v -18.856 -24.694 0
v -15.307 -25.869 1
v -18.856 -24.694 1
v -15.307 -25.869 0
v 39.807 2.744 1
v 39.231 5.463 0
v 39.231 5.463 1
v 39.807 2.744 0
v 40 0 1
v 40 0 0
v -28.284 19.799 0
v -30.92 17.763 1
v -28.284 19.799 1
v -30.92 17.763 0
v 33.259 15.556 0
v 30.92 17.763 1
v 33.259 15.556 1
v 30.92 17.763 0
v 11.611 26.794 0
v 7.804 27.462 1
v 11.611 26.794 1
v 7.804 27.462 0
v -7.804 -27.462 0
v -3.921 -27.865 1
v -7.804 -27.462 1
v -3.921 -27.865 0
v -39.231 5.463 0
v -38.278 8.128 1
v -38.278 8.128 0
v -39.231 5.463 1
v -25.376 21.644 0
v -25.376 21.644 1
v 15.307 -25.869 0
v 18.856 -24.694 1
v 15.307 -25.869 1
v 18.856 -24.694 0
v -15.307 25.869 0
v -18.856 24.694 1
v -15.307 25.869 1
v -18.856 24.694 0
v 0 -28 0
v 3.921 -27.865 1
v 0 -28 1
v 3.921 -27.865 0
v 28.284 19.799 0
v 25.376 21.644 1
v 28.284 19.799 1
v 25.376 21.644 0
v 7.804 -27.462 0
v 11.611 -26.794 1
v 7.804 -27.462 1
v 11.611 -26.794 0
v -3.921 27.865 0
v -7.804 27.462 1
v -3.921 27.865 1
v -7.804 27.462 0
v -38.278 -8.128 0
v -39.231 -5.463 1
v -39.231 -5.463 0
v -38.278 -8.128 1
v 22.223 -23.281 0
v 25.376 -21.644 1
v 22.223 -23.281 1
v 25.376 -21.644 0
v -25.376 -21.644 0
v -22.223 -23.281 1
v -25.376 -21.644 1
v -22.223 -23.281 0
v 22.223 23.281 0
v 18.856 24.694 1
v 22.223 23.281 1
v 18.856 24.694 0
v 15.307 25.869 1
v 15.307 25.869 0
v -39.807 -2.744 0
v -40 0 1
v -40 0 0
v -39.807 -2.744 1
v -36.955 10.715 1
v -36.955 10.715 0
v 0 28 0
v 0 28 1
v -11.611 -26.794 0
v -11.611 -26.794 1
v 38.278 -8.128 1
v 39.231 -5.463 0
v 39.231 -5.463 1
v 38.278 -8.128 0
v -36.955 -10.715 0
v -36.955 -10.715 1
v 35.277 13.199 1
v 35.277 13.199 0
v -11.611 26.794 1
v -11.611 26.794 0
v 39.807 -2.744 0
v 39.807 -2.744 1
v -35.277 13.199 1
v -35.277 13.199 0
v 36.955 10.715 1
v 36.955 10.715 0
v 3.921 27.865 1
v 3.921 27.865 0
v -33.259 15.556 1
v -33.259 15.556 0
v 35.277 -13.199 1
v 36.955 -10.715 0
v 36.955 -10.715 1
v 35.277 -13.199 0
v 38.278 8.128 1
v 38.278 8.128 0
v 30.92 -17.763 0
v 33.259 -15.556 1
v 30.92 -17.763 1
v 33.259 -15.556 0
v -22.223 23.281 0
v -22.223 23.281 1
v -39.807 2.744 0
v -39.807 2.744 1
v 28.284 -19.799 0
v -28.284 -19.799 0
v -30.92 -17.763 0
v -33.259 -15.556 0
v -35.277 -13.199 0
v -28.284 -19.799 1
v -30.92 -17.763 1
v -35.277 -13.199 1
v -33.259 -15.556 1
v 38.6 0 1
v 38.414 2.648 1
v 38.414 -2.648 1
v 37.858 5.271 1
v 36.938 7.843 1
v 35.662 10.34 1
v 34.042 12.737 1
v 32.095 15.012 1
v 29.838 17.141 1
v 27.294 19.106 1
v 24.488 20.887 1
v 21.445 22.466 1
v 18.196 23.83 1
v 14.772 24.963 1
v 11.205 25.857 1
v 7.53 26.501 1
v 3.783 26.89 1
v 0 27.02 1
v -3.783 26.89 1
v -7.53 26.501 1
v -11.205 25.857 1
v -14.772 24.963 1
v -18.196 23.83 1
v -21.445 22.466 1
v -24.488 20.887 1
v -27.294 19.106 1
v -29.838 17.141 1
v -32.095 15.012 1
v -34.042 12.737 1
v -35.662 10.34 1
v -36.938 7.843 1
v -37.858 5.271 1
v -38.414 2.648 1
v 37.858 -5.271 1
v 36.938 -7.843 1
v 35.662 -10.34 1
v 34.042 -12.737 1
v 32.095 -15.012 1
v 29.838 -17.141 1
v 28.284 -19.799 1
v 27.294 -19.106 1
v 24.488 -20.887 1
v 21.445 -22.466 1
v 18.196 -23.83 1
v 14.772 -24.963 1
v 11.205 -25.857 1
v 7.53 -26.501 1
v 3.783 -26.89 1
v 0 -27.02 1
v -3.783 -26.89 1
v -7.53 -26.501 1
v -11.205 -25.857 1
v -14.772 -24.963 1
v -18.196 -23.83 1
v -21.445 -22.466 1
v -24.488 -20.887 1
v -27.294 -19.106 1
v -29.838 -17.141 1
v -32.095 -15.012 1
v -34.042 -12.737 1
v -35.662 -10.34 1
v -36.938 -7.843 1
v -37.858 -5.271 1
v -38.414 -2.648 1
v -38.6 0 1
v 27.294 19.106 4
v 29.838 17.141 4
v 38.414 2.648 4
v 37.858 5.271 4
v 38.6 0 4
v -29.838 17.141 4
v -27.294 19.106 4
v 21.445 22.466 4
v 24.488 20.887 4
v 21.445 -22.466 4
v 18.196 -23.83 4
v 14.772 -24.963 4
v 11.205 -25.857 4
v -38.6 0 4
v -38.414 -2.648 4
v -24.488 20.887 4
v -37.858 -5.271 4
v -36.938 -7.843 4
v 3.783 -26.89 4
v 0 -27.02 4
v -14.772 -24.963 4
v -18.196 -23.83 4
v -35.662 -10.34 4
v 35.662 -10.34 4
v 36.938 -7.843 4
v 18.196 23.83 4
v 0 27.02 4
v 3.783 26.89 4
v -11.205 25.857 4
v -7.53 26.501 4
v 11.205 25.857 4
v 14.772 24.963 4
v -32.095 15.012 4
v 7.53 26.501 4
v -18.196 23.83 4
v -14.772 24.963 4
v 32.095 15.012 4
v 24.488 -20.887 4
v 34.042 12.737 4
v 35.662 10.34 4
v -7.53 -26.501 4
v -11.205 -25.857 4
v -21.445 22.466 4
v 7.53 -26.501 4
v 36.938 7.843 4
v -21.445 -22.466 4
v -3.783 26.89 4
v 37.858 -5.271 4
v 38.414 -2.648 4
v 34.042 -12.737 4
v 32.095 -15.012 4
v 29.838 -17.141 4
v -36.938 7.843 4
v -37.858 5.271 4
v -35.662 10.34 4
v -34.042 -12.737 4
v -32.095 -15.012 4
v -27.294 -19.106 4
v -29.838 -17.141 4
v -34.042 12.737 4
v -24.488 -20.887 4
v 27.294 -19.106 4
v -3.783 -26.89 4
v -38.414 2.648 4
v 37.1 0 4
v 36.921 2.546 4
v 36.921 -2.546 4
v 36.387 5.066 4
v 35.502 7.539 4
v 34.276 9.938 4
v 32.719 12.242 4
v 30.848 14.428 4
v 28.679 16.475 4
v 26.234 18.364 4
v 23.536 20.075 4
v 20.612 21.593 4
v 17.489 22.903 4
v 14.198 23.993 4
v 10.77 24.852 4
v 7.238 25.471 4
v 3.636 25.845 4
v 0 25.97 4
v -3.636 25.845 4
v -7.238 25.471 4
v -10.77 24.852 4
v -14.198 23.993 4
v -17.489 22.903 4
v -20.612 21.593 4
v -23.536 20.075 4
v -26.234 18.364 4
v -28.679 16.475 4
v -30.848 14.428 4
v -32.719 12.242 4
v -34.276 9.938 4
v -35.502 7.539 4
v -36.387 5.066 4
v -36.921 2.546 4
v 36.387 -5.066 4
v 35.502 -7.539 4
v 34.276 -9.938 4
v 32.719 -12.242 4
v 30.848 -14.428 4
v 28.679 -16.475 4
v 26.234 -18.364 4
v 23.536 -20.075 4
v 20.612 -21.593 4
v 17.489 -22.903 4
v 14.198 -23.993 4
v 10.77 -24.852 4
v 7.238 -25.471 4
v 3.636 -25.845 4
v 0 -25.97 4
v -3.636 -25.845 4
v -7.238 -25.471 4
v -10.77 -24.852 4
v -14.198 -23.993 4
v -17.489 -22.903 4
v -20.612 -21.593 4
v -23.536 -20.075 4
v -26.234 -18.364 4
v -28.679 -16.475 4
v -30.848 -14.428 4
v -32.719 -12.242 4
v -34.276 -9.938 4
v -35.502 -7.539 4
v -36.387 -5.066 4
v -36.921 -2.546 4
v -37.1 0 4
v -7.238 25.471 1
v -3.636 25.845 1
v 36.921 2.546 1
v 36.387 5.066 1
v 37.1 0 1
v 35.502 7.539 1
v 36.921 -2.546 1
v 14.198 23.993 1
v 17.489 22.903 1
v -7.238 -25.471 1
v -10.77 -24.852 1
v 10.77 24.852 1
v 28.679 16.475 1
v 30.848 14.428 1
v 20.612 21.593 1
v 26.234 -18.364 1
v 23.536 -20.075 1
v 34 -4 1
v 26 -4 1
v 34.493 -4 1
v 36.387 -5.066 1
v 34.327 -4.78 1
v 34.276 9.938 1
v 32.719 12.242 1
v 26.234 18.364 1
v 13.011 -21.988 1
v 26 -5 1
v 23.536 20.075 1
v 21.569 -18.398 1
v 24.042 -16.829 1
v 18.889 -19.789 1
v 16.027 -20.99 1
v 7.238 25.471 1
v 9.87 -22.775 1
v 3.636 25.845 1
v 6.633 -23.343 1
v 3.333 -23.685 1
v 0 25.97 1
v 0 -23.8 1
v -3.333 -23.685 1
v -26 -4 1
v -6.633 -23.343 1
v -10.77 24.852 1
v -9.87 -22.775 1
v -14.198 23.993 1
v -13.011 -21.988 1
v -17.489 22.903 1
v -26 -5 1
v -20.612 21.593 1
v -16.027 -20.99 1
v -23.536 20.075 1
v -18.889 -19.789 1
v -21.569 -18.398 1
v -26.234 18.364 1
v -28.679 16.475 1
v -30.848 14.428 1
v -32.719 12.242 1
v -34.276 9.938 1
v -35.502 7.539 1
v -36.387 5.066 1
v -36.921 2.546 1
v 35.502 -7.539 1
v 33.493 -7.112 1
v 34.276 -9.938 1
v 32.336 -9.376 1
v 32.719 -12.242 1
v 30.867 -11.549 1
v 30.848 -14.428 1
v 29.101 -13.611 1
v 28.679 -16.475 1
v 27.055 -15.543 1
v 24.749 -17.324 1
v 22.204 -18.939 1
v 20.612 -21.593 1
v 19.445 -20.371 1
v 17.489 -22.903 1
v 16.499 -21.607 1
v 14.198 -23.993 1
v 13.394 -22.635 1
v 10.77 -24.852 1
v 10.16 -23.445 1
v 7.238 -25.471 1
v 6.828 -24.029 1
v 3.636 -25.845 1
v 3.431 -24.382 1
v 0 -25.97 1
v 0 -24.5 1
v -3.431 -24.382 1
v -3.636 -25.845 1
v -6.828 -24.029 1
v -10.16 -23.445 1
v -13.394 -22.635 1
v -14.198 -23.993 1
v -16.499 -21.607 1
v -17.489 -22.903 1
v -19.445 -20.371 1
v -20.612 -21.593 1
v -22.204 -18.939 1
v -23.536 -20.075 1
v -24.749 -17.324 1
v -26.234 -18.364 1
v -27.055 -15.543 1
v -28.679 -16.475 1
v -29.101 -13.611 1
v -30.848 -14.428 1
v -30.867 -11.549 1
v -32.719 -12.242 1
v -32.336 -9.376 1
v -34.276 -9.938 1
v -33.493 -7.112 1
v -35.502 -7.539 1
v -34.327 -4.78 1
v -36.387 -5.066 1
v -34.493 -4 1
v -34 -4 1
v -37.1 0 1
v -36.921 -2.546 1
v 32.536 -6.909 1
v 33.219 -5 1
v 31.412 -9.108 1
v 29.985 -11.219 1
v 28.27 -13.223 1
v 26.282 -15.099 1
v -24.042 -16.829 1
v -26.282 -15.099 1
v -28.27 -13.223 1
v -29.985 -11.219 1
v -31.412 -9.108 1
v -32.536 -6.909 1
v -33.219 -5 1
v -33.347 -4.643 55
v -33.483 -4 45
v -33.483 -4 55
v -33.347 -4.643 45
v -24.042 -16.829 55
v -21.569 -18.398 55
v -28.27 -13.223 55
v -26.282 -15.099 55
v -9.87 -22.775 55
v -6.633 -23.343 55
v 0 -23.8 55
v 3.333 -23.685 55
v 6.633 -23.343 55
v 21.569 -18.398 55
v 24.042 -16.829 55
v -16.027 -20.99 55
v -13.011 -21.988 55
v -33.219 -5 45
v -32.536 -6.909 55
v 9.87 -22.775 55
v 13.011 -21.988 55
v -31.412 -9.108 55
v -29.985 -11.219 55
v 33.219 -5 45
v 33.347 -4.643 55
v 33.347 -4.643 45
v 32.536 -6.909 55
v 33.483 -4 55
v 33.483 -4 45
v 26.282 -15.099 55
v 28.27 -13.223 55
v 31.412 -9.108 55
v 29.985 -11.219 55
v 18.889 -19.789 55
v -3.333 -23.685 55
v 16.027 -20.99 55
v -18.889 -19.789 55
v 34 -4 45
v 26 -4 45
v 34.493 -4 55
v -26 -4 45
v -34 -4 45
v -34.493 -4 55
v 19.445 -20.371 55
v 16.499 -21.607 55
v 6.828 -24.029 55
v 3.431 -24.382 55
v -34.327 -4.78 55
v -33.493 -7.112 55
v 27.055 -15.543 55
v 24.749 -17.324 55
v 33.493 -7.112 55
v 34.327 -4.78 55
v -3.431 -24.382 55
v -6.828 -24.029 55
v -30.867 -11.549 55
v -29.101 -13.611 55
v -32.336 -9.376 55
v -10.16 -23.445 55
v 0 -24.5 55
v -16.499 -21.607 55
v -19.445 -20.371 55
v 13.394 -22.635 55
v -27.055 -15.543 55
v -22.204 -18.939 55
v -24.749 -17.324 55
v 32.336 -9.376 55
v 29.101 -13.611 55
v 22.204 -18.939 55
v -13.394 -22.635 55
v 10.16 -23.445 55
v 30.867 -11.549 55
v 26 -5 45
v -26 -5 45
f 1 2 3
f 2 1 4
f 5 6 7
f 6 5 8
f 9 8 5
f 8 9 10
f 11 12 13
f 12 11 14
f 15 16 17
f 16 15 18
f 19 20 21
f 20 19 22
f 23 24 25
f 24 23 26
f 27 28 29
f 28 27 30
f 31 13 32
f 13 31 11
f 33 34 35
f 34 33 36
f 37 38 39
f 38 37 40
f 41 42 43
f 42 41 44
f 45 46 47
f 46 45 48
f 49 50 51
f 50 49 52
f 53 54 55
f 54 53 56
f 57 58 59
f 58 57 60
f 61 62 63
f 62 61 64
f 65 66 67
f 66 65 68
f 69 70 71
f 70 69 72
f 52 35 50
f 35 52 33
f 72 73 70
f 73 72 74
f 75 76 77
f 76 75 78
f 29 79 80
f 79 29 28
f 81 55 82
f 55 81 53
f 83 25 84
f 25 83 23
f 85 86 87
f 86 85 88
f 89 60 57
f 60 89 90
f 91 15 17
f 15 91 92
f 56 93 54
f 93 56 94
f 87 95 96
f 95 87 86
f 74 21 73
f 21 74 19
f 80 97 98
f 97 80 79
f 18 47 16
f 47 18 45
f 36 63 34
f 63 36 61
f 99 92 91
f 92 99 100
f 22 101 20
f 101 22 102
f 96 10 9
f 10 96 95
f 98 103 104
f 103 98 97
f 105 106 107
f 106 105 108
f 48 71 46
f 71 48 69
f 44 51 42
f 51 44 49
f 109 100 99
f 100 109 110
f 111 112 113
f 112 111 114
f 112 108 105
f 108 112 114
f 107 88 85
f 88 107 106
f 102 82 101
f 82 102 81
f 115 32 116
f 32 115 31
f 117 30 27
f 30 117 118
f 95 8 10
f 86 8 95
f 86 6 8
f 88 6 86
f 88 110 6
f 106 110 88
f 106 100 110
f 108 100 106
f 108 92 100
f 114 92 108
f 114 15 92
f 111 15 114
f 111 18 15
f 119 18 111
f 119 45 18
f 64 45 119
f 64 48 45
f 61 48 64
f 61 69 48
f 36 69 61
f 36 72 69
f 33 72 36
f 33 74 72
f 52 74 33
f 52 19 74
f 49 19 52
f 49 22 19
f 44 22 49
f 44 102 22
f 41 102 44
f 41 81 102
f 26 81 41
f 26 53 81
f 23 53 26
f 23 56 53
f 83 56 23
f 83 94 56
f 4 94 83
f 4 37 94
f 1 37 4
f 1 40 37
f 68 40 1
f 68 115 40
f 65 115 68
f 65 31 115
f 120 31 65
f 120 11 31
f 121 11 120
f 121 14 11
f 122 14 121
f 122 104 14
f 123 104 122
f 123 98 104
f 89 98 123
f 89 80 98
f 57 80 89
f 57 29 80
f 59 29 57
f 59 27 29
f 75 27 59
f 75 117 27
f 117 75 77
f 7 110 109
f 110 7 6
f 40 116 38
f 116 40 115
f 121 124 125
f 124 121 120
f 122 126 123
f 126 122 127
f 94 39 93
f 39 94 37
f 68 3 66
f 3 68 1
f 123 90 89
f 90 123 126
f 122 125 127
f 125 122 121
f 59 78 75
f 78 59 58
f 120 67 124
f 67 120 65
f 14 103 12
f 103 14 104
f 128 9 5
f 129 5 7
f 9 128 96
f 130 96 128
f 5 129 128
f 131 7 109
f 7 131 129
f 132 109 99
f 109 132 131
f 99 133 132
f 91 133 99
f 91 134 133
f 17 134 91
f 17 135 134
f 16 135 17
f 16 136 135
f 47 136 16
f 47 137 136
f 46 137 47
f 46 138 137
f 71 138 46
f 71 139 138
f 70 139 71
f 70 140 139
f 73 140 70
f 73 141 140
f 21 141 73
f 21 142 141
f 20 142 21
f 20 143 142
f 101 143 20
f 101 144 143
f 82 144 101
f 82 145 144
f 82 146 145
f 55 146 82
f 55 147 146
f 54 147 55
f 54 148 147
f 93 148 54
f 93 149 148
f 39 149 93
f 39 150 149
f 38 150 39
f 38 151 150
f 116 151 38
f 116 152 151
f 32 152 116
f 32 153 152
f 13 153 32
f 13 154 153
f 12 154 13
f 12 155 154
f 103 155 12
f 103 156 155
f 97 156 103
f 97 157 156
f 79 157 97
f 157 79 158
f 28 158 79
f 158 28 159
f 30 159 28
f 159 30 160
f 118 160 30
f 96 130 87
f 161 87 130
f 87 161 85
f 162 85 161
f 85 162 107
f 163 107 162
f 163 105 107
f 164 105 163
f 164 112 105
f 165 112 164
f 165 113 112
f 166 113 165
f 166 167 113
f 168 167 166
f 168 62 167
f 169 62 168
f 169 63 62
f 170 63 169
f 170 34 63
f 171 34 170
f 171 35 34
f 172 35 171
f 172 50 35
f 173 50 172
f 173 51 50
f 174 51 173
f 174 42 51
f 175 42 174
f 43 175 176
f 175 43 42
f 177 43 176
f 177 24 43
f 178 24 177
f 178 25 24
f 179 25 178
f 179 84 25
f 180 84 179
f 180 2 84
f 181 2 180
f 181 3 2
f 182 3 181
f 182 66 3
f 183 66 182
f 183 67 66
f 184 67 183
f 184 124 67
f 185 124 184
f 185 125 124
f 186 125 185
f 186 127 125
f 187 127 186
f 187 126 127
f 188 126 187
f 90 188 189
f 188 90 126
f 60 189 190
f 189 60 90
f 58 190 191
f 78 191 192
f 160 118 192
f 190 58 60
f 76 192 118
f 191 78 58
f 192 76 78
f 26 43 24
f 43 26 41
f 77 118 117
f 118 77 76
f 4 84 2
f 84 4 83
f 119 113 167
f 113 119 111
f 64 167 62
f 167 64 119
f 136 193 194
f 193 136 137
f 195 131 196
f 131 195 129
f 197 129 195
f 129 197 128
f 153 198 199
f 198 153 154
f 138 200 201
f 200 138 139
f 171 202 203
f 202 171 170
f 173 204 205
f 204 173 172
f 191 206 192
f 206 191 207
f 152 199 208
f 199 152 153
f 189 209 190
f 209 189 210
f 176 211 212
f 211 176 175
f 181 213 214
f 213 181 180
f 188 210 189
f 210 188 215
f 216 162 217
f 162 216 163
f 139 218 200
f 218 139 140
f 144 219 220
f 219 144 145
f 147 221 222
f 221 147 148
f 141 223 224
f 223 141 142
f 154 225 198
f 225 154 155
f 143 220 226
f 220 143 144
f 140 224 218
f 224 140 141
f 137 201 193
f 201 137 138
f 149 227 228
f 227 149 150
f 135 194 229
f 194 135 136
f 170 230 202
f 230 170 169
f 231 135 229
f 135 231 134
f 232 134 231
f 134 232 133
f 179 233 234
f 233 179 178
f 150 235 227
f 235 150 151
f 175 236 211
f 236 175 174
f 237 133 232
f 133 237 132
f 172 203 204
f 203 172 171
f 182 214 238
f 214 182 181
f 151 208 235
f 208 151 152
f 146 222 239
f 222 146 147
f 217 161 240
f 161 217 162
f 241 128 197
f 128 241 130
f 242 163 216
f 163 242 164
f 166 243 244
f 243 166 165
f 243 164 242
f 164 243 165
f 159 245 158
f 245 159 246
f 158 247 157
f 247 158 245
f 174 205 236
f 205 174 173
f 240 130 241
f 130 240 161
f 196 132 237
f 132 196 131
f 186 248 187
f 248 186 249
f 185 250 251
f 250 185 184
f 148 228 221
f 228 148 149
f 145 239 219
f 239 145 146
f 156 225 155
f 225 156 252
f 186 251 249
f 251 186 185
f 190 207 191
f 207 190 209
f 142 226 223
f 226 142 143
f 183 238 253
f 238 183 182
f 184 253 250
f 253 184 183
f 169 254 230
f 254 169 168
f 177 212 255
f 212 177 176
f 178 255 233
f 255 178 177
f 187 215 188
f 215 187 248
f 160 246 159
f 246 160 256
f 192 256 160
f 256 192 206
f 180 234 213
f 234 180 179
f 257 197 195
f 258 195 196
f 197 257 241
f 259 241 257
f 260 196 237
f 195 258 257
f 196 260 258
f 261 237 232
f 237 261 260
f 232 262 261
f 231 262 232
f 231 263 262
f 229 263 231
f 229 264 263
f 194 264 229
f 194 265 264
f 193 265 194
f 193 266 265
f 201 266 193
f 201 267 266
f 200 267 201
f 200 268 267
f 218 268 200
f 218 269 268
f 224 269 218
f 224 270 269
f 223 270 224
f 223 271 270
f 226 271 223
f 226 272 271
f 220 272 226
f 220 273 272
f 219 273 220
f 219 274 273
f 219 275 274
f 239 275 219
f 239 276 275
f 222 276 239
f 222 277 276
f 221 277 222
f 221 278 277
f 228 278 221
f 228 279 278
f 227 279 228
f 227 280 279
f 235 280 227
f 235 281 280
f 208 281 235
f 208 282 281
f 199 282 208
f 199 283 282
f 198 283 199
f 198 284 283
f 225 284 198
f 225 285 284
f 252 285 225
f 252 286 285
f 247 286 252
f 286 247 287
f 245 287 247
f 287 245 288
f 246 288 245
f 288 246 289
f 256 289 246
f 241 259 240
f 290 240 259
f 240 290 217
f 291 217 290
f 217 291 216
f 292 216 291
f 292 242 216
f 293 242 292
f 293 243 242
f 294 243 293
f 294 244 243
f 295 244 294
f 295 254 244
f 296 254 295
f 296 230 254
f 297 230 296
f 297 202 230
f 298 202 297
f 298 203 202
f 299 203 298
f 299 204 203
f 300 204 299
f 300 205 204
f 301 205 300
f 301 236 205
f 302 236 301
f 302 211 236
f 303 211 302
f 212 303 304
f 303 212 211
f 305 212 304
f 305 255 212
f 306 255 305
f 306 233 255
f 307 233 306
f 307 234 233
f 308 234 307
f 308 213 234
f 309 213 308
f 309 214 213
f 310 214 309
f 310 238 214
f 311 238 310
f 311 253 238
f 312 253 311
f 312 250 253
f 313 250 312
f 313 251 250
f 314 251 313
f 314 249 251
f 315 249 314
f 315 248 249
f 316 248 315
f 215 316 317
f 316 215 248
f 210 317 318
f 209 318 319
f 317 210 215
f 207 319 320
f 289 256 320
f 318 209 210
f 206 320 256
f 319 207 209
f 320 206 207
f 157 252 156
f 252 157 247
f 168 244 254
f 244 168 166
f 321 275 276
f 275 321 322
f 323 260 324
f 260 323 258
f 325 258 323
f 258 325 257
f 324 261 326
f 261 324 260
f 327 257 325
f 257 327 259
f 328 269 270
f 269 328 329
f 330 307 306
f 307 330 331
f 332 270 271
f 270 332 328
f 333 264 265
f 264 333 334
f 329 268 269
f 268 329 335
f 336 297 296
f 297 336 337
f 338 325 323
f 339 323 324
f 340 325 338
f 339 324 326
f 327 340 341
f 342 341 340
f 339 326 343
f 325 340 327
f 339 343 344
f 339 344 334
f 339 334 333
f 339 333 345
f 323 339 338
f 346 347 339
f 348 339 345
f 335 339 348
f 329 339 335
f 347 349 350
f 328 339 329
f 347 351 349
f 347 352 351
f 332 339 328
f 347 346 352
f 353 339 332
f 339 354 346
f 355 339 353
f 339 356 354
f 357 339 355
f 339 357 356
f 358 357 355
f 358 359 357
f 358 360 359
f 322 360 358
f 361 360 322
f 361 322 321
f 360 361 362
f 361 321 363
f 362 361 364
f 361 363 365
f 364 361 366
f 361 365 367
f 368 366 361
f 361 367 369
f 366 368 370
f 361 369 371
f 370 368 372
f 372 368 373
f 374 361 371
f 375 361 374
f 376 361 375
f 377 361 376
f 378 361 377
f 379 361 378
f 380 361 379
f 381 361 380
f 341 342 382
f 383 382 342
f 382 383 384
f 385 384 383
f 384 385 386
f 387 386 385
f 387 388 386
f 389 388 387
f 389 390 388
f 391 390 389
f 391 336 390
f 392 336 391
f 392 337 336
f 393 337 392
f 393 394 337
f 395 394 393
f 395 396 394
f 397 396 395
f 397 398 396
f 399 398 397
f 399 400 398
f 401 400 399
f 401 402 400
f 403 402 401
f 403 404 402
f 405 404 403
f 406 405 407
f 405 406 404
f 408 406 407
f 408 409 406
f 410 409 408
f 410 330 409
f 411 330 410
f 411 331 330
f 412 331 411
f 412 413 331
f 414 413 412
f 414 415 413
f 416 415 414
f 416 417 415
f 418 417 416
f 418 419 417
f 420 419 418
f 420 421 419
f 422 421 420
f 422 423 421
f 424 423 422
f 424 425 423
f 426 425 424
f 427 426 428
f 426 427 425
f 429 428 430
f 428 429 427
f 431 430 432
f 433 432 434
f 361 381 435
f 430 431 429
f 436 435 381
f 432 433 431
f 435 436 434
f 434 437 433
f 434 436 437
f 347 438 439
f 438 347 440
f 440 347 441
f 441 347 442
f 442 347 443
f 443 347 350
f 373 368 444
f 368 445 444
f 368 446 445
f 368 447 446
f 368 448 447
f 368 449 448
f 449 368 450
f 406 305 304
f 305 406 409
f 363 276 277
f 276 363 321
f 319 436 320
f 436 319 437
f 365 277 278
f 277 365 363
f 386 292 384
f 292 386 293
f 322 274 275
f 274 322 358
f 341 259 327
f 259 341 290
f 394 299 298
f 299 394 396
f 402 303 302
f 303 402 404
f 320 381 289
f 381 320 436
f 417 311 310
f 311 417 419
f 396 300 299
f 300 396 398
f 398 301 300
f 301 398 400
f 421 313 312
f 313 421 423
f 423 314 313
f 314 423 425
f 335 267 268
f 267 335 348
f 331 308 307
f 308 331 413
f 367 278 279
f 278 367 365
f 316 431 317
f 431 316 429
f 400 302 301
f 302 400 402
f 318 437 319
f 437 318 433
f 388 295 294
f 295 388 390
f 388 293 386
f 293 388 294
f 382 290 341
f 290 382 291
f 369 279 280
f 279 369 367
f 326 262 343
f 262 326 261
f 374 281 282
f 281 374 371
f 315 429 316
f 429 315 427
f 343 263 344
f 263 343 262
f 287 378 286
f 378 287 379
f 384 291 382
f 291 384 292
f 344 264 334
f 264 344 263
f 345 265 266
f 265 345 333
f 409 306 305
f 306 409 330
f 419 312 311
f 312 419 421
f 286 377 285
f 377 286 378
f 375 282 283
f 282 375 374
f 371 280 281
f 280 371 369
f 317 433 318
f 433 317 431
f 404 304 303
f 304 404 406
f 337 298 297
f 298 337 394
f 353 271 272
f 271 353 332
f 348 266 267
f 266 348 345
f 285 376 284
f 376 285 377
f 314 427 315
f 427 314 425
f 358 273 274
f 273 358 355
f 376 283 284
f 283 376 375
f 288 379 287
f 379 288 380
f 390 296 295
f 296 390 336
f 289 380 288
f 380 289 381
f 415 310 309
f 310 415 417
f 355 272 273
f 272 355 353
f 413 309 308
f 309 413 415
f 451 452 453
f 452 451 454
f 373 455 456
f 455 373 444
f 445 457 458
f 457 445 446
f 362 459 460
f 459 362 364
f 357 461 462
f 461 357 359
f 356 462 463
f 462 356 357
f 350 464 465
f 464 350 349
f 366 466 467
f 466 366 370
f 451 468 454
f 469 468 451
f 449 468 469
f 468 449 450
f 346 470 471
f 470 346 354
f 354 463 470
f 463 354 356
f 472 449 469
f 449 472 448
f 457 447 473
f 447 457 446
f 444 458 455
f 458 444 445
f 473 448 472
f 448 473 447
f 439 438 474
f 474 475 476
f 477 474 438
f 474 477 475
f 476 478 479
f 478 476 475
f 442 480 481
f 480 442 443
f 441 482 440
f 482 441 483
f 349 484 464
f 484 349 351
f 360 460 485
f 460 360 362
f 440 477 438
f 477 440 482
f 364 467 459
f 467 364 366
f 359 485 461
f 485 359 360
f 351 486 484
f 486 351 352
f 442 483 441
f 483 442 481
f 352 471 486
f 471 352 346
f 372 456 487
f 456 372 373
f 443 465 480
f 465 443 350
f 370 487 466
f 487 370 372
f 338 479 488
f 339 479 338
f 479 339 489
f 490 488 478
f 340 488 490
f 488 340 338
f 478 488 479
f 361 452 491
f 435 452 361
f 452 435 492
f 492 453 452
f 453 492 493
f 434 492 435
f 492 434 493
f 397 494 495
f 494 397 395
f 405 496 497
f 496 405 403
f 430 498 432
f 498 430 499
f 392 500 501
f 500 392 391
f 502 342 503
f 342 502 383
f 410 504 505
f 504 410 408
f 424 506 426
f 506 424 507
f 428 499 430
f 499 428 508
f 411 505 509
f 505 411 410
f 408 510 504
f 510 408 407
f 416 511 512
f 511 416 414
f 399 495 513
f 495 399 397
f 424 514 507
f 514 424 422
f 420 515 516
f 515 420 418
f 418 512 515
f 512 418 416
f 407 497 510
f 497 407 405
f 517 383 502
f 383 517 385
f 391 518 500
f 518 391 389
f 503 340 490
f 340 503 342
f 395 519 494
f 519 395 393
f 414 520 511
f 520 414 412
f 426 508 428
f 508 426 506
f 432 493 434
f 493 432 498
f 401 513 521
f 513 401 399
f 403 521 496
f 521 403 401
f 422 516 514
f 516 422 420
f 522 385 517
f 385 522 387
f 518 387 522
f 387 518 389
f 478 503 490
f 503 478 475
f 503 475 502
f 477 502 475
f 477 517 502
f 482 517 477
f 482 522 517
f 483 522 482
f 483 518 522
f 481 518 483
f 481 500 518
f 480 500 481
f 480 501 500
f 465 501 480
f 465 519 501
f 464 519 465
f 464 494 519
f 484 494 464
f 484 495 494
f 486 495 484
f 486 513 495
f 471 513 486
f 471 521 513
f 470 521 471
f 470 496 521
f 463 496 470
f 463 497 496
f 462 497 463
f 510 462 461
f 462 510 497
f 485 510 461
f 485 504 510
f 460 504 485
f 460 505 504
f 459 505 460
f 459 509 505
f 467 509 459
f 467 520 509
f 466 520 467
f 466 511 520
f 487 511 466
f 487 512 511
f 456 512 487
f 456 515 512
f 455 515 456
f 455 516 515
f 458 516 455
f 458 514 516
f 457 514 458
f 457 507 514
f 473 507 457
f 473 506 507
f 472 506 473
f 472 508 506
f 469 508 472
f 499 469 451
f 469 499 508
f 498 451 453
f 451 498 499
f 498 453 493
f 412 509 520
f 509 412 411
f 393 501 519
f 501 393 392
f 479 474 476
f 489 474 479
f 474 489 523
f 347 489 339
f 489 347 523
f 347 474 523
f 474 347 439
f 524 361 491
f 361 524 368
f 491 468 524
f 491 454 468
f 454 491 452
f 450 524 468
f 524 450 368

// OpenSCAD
// Depth of the cradle should be 45mm.
// The right diameter for the thermometer is scale(0.195) import (file = "shape.dxf", layer = "Layer_1");
module cradle() {

difference() {
    union() {
        //translate([-45/2, -20, 0]) cube([45, 40, 50]);
        //translate([-45/2, -35, 0]) cube([45, 40, 10]);

		//rotate([90,0,0]) scale([1,1.5,1]) cylinder(r=25, h=60, $fn=64);

		translate([0,32,50])  rotate([90-30,0,180]) 	{ 
	intersection() {
	linear_extrude(height = 4.5, center = false, convexity = 10) 
		scale([0.18, 0.18]) import (file = "tellulogo.dxf", layer="tellu", $fn=128);
	scale([1,1,0.3]) sphere(r=14.3, $fn=64);
	}
	translate([0,0,-20+1]) cylinder(r=14.3, h=20, $fn=64);
}

		scale([1,0.7,1]) { 
			cylinder(r=40, h=55, $fn=64);
			translate([0,0,55]) {
				rotate_extrude(convexity = 10, $fn = 64) translate([30, 0, 0])
				circle(r = 10, $fn = 64);

			}
		}

       /*
        translate([0,8,0]) rotate([15,0,0]) linear_extrude(convexity = 10, $fn=128) 
            scale(0.30) import (file = "shape.dxf", layer = "Layer_1");
        */
    }
    
    union() {

		//translate([-20,2,-1]) cube([40,1,14]);

		//rotate([90,0,0]) scale([1,1,1]) translate([0,0,1]) cylinder(r=12, h=1, $fn=64);


	


		translate([-50,-80,-50]) cube([100,100,50]);

		translate([0,32,50])  rotate([90-30,0,180]) 	{ 
			translate([0,0,-24]) cylinder(r=14.3-1, h=20, $fn=64);
		}

        translate([0,12,15]) rotate([15,0,0]) linear_extrude(height = 80, convexity = 10, $fn=128) 
            scale(0.195) import (file = "shape.dxf", layer = "Layer_1");

		 translate([0,15,0]) rotate([0,0,0]) linear_extrude(height = 20, convexity = 10, $fn=128) 
            scale(0.10) import (file = "shape.dxf", layer = "Layer_1");
    }
    
}

}


module bottom() {
	difference() {

		union() {
			scale([1,0.7,1]) cylinder(r=40, h=1, $fn=64);
			scale([1,0.7,1]) cylinder(r=38.6, h=4, $fn=64);
		}

		union() {
			translate([0,0,1]) scale([1,0.7,1]) cylinder(r=38.6-1.5, h=5, $fn=64);
			//translate([0,0,-1]) cylinder(r=20, h=6, $fn=64);

		}
	}
	
	difference() {
		union() {
			scale([1,0.7,1]) cylinder(r=35, h=55, $fn=64);	
		}
		union() {
			scale([1,0.7,1]) translate([0,0,-1]) cylinder(r=34, h=60, $fn=64);
			translate([-50, -4, -2])cube([100, 50, 60]);
			
		}
		
	}

	translate([30-4,-5,0]) cube([8,1,45]);
	translate([-30-4,-5,0]) cube([8,1,45]);

}


bottom();
